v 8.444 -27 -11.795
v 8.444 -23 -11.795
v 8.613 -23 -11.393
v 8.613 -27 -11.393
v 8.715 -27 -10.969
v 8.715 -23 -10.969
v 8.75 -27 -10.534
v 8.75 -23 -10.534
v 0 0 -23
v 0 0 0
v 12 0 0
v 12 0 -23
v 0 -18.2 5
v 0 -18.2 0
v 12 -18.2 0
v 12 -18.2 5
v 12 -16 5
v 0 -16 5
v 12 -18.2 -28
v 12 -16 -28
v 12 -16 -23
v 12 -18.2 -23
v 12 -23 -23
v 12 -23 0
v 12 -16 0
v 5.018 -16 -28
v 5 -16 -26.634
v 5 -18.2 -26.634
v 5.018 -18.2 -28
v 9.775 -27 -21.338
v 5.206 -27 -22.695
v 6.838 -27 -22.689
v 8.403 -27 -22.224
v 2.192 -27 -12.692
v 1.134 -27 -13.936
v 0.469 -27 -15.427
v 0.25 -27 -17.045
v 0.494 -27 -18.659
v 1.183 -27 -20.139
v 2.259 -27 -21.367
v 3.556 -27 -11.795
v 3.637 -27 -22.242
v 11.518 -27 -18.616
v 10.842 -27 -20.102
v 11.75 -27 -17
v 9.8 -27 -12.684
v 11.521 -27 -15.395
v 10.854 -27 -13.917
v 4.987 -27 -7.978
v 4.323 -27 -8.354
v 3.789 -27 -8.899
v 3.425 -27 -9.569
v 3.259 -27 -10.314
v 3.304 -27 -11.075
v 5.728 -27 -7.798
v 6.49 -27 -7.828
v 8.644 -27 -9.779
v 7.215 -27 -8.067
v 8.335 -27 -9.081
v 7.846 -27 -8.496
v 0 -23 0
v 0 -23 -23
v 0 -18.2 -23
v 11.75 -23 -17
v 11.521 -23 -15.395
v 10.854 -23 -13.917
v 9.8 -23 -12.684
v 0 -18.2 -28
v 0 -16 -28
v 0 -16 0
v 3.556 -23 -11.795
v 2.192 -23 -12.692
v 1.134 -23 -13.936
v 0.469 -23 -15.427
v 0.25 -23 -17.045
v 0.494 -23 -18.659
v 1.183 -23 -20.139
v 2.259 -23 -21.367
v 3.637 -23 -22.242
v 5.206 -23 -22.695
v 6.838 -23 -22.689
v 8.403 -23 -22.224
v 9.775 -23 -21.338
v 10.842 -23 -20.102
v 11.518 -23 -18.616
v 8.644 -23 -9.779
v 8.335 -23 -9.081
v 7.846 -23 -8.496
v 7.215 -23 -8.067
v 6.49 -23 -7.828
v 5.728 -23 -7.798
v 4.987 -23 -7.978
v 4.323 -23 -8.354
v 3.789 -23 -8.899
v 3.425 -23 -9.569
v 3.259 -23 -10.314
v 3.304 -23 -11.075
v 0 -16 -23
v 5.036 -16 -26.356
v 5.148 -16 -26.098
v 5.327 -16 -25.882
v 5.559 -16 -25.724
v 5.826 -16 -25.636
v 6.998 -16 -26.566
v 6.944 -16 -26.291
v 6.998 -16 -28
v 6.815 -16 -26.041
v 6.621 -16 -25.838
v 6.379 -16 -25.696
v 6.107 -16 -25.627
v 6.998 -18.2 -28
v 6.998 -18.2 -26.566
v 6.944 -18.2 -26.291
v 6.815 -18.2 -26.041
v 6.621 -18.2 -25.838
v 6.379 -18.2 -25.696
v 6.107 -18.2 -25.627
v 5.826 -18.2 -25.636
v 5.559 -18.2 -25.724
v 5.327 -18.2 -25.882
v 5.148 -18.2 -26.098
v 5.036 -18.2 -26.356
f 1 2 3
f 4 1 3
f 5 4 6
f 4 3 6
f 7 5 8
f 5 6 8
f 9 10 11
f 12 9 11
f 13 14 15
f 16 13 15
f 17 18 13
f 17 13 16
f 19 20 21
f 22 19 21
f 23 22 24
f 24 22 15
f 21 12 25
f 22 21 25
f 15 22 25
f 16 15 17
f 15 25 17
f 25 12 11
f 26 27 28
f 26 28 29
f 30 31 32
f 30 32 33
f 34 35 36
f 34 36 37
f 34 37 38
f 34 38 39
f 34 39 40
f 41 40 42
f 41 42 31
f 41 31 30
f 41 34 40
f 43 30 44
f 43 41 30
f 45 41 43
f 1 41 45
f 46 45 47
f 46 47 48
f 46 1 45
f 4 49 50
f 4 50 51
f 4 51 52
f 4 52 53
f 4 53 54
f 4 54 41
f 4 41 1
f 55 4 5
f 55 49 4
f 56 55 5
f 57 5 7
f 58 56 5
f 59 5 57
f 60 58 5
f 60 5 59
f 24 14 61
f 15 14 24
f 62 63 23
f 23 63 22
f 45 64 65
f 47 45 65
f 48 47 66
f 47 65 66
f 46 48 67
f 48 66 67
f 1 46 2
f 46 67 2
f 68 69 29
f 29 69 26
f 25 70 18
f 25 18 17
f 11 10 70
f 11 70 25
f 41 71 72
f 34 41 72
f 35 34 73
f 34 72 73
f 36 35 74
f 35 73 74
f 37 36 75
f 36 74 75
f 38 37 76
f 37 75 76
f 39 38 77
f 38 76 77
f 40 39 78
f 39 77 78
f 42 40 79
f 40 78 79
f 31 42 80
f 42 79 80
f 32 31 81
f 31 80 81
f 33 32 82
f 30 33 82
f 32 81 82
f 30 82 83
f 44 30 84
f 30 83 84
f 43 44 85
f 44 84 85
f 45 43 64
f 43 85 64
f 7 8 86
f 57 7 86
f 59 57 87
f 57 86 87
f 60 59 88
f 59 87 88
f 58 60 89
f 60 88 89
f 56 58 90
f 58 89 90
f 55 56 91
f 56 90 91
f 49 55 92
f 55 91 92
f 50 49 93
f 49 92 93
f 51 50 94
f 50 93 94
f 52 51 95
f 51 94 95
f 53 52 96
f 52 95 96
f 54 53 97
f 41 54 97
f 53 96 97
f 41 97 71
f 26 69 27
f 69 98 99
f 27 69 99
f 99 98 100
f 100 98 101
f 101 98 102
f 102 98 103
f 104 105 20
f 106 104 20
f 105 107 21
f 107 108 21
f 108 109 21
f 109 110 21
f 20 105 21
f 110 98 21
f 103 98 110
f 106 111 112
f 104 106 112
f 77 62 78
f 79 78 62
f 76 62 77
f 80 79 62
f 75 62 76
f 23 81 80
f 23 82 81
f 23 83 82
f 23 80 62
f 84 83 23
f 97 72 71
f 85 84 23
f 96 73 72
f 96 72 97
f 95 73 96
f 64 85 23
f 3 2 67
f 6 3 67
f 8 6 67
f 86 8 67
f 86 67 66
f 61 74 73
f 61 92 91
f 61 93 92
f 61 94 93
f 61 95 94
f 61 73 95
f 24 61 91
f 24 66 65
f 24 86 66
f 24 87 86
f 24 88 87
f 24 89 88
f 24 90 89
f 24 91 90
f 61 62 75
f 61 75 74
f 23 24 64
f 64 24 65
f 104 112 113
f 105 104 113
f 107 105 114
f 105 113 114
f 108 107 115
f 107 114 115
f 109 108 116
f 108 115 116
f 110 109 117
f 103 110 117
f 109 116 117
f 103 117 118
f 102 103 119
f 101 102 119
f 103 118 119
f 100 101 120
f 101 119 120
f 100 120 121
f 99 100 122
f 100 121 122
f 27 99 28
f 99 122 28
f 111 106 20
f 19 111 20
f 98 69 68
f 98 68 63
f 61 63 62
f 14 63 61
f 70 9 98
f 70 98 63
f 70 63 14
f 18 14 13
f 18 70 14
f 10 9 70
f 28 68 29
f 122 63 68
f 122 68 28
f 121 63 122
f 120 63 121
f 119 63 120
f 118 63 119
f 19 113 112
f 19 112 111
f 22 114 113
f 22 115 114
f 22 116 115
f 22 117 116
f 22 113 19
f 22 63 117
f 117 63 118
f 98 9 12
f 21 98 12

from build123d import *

# Parameters (mm, degrees)
F0_W     = 12
F0_H     = 23
F1_DEPTH = 23
F3_DEPTH = 4
F4_W     = 12
F4_H     = 2.2
F5_DEPTH = 5
F6_DEPTH = 28
F8_DEPTH = 4.36513


with BuildPart() as f1:
    # F0 (on Front) → F1 (new body)
    with BuildSketch(Plane.XZ):
        with Locations((6, -11.5)):
            Rectangle(F0_W, F0_H)
    extrude(amount=F1_DEPTH)

    # F2 (on face) → F3 (join)
    with BuildSketch(Plane.XZ.offset(23)):
        with BuildLine():
            ThreePointArc((3.556097, -11.79521), (6, -11.25), (8.443903, -11.79521))
            ThreePointArc((8.443903, -11.79521), (8.67238, -11.183078), (8.75, -10.534323))
            ThreePointArc((8.75, -10.534323), (5.351245, -7.861942), (3.556097, -11.79521))
        make_face()
        with BuildLine():
            ThreePointArc((3.556097, -11.79521), (6, -13.284323), (8.443903, -11.79521))
            ThreePointArc((8.443903, -11.79521), (6, -11.25), (3.556097, -11.79521))
        make_face()
        with BuildLine():
            ThreePointArc((3.556097, -11.79521), (2.916977, -21.853604), (11.75, -17))
            ThreePointArc((11.75, -17), (10.853604, -13.916977), (8.443903, -11.79521))
            ThreePointArc((8.443903, -11.79521), (6, -13.284323), (3.556097, -11.79521))
        make_face()
    extrude(amount=F3_DEPTH)

    # F4 (on face) → F5 (join)
    with BuildSketch(Plane.XY):
        with Locations((6, -17.1)):
            Rectangle(F4_W, F4_H)
    extrude(amount=F5_DEPTH)

    # F4 (on face) → F6 (join)
    with BuildSketch(Plane.XY):
        with Locations((6, -17.1)):
            Rectangle(F4_W, F4_H)
    extrude(amount=-F6_DEPTH)

    # F7 (on face) → F8 (cut)
    with BuildSketch(Plane.XZ.offset(18.2)):
        with BuildLine():
            Line((6.998493, -29.572871), (6.998493, -26.675947))
            Line((6.998493, -26.675947), (6.998493, -26.566196))
            ThreePointArc((6.998493, -26.566196), (5.96604, -25.621648), (5.000085, -26.634102))
            Line((5.000085, -26.634102), (5.036416, -29.422127))
            Line((5.036416, -29.422127), (6.998493, -29.572871))
        make_face()
    extrude(amount=-F8_DEPTH, mode=Mode.SUBTRACT)


solid = f1.part
